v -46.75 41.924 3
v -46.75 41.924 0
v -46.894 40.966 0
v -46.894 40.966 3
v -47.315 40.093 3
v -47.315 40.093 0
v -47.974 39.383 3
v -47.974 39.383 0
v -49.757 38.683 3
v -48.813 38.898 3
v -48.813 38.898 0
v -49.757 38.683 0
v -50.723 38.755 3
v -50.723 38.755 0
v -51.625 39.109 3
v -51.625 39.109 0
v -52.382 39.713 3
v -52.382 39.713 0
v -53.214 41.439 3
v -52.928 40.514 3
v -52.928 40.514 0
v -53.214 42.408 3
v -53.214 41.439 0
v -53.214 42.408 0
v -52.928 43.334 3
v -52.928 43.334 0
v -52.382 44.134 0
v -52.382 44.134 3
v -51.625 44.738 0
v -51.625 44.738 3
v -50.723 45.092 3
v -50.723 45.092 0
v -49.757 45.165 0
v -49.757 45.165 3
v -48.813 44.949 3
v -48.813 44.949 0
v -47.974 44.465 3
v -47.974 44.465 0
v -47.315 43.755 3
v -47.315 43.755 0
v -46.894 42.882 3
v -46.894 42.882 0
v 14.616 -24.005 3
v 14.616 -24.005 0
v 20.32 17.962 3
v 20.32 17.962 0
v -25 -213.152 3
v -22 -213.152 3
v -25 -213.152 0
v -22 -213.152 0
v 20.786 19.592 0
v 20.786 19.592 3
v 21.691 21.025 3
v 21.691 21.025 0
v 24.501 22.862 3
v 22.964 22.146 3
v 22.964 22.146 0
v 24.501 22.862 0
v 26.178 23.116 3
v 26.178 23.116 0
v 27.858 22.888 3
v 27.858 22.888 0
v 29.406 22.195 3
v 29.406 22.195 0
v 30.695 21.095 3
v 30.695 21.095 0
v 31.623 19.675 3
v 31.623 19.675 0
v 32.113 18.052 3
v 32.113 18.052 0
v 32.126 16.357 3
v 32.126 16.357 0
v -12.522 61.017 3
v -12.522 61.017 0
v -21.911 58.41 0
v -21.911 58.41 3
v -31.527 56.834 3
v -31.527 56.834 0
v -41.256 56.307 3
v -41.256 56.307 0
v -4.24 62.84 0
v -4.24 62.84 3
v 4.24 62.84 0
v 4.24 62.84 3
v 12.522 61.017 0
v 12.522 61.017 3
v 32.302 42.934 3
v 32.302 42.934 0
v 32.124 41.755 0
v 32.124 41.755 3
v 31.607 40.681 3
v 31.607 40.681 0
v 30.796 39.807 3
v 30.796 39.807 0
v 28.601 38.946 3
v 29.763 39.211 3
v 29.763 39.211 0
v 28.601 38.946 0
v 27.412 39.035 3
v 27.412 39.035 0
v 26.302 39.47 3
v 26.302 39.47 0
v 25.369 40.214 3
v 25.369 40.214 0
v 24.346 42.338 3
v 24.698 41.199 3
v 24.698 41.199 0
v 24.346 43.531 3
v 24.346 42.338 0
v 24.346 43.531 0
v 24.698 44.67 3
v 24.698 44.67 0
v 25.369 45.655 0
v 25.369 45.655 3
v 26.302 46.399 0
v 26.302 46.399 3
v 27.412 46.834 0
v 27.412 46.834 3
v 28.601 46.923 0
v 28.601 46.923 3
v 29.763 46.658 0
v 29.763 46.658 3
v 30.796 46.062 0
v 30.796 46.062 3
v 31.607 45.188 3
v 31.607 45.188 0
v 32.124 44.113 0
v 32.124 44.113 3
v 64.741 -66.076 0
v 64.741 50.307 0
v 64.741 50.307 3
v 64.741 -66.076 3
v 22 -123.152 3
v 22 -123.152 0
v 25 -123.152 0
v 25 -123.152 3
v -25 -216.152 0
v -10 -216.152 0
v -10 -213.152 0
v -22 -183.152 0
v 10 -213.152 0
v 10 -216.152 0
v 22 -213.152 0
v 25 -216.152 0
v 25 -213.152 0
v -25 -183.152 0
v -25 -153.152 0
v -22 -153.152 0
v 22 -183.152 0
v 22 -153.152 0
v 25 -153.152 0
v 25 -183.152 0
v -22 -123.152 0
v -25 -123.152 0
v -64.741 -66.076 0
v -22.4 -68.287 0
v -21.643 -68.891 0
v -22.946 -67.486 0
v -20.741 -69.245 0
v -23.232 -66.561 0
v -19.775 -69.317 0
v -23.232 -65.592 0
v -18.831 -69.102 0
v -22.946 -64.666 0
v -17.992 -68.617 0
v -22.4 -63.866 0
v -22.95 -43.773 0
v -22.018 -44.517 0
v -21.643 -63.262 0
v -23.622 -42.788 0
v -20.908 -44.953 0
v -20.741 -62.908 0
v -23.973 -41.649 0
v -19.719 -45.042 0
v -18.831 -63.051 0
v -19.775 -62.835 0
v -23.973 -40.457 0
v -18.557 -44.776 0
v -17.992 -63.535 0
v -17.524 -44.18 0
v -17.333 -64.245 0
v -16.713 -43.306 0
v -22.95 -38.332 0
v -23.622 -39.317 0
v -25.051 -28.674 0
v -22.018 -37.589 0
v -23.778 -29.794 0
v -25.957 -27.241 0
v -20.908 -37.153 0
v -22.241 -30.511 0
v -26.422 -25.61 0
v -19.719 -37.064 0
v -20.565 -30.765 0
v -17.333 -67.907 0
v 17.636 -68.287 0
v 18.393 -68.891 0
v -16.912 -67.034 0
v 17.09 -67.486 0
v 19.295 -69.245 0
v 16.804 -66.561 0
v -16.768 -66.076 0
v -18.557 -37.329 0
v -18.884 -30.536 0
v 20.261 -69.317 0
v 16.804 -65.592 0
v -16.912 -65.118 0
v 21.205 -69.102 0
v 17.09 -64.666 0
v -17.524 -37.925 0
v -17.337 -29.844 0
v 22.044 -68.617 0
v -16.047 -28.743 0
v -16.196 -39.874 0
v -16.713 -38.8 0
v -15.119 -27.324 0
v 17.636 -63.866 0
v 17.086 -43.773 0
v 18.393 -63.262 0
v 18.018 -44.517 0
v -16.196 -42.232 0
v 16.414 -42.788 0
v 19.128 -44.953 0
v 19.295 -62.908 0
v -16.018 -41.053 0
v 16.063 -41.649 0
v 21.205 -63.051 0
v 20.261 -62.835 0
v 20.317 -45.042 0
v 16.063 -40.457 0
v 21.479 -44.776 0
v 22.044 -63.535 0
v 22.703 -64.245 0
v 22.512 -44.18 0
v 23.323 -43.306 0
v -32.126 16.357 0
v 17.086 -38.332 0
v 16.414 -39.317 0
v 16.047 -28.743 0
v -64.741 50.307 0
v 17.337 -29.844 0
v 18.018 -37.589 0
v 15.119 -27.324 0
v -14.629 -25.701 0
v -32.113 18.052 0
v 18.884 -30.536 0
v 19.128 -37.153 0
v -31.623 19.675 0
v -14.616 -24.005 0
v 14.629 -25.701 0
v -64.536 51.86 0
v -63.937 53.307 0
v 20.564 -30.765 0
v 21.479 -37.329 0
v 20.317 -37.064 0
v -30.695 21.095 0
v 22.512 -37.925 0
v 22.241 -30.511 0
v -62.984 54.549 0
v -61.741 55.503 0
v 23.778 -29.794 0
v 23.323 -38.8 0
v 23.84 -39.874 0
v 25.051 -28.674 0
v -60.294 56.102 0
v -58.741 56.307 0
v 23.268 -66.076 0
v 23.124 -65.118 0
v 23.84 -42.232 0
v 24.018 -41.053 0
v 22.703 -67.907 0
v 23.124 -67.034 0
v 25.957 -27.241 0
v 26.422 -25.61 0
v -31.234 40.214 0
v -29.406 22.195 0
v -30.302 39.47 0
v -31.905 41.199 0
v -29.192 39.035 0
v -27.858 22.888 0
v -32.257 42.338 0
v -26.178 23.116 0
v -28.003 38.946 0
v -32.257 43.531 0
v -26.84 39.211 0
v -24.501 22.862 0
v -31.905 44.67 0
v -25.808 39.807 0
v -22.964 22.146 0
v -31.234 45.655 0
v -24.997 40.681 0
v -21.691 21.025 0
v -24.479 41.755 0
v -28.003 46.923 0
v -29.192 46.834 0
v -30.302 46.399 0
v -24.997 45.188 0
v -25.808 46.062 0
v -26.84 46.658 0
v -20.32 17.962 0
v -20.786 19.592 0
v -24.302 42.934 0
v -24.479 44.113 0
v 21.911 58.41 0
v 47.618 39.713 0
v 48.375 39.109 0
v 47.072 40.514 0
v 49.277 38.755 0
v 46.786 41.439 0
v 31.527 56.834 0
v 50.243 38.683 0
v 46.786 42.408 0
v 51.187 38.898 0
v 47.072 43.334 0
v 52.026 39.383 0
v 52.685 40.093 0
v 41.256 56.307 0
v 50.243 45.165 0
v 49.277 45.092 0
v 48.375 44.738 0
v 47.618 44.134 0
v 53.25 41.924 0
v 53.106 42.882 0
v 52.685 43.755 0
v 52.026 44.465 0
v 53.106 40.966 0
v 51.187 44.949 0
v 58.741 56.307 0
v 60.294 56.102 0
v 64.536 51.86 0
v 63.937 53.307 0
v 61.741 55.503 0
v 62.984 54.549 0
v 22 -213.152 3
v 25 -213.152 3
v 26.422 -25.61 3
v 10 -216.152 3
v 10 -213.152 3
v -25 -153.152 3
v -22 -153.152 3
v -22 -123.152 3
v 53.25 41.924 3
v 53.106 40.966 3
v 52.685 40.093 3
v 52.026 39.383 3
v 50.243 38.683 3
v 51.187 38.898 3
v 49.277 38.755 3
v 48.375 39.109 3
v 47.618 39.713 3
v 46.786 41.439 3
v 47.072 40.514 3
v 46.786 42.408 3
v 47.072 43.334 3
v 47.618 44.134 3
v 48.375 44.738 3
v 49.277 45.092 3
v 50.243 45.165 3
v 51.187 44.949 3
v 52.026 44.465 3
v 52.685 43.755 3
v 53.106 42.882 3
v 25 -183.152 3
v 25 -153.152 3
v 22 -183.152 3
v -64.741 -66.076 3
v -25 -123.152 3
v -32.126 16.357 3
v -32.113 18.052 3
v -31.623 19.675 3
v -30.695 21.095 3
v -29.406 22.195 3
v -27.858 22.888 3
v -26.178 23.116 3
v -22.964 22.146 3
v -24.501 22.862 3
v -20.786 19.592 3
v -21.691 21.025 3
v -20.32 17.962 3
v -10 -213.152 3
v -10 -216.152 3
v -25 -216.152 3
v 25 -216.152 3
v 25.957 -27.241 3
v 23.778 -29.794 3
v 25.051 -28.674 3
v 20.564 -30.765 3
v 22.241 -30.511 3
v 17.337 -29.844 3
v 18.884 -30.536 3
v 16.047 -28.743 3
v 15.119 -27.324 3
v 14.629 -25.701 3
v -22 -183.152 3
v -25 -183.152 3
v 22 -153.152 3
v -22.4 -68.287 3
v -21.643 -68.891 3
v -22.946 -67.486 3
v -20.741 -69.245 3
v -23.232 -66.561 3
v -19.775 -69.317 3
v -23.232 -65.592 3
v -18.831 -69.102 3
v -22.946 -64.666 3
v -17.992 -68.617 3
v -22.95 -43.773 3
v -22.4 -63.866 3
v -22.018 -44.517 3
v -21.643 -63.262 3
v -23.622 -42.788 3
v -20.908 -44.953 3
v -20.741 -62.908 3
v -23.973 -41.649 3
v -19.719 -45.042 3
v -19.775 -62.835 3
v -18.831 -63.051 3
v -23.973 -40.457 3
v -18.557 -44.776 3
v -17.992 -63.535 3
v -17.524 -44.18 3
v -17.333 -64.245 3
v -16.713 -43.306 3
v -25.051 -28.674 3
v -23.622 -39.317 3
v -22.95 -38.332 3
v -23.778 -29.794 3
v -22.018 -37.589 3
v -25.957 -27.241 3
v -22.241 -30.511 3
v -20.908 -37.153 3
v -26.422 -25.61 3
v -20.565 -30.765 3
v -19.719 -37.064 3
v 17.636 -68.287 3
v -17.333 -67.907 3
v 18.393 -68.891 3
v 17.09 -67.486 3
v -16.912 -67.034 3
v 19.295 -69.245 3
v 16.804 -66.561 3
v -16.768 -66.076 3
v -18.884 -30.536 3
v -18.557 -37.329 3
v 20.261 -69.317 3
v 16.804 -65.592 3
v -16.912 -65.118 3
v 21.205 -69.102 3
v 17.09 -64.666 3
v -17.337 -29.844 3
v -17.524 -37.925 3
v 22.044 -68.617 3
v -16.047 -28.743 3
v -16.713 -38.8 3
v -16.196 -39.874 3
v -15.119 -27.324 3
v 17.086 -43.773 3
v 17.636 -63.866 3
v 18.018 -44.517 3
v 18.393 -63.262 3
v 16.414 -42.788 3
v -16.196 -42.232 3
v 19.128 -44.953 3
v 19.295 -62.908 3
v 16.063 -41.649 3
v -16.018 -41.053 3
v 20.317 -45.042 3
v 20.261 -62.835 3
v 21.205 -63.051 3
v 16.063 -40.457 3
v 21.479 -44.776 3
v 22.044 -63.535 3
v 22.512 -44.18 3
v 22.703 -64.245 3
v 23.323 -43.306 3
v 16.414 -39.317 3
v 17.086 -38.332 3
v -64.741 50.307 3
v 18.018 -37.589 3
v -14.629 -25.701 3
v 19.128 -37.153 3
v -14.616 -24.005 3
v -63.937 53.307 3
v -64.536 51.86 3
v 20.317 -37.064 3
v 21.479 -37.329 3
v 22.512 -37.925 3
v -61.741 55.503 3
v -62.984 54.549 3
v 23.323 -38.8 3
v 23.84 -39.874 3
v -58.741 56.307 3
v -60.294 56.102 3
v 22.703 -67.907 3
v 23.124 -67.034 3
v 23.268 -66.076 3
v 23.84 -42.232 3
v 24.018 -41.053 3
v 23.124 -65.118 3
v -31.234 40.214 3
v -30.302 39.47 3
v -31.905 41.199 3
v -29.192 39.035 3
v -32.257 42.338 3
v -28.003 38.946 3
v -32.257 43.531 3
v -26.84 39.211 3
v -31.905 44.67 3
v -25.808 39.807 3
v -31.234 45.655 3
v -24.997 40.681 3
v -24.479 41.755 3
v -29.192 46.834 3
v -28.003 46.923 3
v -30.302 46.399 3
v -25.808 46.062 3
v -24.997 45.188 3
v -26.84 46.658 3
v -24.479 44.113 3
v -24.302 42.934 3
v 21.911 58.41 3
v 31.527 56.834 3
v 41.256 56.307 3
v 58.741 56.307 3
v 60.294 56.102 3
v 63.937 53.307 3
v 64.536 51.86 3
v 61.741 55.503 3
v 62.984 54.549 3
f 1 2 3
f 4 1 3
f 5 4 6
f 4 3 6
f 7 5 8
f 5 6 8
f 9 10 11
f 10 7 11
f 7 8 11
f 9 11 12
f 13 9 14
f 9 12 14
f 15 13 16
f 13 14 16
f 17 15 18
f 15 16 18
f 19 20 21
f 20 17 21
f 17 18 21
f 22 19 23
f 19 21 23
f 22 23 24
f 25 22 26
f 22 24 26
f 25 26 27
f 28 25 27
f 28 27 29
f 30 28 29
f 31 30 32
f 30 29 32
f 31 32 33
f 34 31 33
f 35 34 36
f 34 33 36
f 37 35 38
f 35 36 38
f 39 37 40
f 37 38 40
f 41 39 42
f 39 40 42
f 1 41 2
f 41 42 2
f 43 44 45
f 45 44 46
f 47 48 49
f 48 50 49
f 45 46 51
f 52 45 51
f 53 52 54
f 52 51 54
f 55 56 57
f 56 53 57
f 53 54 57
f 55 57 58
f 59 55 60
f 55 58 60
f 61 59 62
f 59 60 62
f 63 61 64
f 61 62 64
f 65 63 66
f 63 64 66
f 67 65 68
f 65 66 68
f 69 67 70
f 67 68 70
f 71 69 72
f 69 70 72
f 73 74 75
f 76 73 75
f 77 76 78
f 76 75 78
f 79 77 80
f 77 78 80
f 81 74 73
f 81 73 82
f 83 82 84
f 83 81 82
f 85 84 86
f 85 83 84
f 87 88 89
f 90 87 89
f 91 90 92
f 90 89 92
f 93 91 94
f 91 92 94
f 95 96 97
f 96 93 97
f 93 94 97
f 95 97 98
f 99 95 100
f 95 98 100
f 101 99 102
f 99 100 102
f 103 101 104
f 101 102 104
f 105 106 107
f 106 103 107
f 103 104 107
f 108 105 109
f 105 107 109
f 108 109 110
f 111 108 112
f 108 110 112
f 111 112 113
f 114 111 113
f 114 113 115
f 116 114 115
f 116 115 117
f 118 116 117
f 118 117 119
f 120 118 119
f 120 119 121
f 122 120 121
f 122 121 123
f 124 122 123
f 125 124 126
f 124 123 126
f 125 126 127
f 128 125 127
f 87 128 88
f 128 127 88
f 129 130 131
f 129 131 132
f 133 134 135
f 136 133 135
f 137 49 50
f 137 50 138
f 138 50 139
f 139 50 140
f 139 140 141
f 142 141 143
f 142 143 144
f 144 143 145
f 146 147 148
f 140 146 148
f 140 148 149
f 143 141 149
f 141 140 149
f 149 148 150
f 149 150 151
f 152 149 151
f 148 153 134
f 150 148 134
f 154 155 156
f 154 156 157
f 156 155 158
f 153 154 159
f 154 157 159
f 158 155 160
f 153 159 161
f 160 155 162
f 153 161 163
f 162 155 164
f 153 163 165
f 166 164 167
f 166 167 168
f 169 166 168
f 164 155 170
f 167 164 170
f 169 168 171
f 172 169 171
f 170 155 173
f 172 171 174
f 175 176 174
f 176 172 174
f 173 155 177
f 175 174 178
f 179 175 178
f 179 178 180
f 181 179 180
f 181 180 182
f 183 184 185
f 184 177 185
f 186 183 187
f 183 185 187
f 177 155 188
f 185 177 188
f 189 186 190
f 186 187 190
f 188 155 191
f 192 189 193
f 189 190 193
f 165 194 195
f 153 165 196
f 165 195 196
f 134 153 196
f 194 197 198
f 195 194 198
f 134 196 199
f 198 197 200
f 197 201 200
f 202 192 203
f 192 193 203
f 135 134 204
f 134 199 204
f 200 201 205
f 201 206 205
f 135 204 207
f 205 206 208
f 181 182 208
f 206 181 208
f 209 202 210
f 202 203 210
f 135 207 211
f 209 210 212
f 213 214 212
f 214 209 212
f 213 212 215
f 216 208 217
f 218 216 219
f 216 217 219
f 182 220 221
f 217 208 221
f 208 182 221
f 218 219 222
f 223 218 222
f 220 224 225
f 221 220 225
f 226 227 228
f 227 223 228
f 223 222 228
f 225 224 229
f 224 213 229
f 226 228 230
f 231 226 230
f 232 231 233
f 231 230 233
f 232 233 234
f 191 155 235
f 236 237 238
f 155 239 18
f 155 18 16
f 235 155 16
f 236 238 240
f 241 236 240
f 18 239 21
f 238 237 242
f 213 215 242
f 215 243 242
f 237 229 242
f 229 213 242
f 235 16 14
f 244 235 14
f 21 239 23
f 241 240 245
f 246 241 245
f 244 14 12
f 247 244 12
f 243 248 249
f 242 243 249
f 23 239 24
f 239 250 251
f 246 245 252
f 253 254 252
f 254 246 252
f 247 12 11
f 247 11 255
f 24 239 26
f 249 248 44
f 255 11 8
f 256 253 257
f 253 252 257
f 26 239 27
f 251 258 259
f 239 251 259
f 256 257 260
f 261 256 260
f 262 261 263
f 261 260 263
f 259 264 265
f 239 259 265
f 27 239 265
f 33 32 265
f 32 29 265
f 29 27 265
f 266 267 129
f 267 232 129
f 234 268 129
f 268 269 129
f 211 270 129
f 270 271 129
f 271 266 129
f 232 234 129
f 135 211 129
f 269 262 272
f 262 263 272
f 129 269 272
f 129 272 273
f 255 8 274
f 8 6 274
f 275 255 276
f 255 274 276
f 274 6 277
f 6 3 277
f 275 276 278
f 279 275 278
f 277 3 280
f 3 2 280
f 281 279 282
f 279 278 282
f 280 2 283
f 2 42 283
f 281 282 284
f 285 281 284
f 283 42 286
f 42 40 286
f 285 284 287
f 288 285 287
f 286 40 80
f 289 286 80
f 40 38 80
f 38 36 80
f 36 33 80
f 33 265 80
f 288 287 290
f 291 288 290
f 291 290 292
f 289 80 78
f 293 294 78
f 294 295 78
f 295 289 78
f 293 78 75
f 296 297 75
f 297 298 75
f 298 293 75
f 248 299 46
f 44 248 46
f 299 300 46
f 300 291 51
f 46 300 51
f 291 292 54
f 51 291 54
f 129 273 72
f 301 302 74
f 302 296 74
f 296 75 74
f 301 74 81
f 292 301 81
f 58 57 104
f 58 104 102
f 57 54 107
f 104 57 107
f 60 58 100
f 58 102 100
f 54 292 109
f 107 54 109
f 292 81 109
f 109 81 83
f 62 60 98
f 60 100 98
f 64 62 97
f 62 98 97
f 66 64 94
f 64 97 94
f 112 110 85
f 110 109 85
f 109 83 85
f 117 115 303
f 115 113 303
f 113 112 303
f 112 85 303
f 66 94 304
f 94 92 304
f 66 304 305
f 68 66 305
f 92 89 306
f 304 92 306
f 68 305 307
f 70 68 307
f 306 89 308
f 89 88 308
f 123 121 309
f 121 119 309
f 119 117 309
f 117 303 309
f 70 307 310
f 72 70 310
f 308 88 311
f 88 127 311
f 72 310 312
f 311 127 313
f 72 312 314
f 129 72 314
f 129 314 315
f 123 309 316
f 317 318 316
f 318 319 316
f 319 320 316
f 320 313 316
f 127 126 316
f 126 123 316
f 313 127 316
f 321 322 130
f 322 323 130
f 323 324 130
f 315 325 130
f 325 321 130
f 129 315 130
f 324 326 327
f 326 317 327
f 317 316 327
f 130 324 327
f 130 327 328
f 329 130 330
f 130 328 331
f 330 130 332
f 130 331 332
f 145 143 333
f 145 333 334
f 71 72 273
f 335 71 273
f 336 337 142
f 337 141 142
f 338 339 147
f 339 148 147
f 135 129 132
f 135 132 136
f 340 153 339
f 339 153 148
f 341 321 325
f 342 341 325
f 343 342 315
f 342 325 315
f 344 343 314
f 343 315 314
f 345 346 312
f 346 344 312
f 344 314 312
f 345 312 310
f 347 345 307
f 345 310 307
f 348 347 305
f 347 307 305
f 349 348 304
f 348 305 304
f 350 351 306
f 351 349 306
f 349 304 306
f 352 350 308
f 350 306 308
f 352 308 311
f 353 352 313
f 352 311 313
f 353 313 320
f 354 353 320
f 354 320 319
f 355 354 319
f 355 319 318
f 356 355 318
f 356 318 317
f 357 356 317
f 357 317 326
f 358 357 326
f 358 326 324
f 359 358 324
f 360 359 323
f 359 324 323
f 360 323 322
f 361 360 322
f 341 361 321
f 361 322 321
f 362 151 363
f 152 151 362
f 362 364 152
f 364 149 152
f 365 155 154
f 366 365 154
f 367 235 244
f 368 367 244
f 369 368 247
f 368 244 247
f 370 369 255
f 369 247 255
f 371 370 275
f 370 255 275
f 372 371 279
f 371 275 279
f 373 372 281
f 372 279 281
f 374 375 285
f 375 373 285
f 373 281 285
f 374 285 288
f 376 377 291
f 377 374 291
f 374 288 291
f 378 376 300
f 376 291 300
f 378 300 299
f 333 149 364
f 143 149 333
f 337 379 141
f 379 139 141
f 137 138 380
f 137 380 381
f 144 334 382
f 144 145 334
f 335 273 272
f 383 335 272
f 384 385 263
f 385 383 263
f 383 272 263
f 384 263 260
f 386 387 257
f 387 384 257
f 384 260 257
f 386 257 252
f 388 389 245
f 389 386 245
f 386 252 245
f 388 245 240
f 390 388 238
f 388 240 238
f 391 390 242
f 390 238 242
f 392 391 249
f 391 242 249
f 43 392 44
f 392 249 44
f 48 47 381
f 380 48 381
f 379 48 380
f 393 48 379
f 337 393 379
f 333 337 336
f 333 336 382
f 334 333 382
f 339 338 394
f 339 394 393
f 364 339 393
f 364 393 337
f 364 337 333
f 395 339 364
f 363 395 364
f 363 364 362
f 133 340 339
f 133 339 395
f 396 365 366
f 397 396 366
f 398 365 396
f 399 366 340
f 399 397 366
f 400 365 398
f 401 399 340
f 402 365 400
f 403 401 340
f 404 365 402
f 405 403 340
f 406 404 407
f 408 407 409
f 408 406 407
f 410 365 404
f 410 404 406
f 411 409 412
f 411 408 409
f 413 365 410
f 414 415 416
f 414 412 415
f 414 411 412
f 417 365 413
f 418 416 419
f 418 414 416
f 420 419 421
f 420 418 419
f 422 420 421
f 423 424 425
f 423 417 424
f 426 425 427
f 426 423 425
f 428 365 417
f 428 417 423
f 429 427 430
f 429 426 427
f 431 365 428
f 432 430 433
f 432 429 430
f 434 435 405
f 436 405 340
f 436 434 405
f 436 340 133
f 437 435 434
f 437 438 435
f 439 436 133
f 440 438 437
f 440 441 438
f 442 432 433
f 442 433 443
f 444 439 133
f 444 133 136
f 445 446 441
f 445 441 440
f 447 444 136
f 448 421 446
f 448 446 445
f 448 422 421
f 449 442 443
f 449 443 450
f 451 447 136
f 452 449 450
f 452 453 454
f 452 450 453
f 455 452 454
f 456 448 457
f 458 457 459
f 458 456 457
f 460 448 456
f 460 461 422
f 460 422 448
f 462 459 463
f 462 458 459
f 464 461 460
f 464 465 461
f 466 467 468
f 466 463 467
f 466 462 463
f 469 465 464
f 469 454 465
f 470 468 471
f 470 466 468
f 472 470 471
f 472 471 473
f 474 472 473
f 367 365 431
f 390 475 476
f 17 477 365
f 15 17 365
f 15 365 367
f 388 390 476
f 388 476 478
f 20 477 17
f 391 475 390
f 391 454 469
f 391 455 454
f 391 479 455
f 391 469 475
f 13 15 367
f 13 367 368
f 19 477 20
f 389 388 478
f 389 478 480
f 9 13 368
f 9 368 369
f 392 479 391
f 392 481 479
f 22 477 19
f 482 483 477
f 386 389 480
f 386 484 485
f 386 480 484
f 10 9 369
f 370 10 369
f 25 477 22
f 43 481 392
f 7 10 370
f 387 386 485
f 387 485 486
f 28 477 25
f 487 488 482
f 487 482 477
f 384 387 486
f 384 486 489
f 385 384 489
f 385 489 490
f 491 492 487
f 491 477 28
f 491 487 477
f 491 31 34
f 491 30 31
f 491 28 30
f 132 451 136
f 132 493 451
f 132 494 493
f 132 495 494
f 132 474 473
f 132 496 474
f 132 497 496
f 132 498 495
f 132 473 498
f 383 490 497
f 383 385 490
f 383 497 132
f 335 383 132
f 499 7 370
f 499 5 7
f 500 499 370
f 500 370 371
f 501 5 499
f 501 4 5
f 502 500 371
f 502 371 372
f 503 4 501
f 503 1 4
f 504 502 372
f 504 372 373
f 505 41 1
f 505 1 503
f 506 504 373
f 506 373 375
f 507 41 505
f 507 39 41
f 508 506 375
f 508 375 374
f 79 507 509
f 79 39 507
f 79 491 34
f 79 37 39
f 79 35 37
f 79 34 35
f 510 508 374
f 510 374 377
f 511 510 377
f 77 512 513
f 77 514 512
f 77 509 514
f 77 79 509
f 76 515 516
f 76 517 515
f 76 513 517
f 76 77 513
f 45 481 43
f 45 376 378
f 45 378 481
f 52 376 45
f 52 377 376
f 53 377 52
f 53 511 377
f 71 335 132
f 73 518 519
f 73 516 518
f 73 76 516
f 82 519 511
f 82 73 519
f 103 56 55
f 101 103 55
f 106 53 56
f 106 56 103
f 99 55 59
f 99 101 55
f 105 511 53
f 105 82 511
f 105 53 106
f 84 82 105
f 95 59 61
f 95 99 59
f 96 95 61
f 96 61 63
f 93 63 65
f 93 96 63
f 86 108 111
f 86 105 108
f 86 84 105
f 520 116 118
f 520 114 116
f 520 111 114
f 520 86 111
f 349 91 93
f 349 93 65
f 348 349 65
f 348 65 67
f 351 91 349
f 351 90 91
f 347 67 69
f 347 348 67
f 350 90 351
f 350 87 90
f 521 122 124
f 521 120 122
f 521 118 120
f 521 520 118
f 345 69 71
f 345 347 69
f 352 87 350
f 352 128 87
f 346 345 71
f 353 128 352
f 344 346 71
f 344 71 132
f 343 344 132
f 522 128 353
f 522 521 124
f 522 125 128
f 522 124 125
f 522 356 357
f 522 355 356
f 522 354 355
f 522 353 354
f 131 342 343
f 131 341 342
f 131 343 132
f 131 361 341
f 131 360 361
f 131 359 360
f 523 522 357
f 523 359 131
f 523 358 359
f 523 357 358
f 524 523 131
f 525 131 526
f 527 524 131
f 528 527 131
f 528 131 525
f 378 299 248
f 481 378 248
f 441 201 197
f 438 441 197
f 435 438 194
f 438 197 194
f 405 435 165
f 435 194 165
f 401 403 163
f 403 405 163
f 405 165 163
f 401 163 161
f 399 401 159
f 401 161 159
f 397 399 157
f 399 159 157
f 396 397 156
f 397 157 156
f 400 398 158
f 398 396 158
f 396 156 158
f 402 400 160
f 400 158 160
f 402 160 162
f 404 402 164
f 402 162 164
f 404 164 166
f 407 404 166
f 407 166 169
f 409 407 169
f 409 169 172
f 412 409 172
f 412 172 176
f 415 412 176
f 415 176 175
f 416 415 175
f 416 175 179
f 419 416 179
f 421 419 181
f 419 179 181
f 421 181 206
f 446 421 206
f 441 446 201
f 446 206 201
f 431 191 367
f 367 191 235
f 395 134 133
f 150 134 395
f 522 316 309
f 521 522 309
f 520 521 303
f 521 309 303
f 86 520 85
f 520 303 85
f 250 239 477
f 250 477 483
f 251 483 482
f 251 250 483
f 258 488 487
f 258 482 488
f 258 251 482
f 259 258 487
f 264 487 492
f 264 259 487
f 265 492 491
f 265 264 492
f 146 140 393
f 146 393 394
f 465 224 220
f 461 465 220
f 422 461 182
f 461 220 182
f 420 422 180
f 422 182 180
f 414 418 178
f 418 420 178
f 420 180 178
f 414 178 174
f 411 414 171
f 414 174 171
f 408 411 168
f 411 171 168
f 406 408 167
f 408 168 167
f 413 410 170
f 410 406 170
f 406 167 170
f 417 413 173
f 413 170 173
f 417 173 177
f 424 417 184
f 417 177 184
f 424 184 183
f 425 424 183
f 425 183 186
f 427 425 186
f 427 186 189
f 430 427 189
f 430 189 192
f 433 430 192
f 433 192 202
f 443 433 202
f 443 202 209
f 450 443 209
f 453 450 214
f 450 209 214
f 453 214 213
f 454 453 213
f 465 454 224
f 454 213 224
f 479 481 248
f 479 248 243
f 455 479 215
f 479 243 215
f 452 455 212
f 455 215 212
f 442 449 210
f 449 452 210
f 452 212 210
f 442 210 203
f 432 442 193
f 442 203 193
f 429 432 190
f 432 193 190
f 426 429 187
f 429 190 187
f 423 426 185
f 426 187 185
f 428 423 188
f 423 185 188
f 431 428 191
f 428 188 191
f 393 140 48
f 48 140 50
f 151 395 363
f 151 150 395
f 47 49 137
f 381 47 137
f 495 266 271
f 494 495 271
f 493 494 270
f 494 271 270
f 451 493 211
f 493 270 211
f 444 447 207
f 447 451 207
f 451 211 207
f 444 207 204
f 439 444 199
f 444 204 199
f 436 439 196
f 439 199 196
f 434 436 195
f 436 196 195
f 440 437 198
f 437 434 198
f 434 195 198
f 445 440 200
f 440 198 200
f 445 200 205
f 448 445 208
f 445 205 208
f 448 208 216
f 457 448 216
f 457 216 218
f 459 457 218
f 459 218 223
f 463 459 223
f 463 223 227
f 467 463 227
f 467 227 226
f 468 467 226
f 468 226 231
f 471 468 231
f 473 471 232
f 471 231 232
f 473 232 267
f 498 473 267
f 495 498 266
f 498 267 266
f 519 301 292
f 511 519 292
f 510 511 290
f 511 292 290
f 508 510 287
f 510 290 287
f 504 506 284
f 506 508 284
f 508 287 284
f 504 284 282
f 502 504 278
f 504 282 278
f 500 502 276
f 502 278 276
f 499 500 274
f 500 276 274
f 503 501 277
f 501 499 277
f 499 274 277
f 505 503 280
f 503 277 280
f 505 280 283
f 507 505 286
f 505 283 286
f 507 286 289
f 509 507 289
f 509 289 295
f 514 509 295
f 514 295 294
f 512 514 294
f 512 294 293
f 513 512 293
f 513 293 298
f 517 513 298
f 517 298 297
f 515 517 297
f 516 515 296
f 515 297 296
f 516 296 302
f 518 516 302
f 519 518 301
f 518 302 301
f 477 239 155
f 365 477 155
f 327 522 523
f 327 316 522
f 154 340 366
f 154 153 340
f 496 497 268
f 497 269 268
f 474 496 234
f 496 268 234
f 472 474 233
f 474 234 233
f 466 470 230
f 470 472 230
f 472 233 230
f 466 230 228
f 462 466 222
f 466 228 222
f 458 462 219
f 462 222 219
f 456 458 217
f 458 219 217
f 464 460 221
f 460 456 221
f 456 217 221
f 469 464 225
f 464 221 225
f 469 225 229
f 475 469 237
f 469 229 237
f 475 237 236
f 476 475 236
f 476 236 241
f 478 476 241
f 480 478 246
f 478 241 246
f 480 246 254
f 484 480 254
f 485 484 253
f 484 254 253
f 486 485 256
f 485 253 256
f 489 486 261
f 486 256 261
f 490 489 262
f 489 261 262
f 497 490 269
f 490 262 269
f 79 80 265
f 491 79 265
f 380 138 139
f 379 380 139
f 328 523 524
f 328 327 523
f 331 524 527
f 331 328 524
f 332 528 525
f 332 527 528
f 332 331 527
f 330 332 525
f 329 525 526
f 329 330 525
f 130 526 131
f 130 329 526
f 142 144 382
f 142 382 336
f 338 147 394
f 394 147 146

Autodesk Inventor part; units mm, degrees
ref_plane "YZ Plane" through (0, 0, 0) normal (1, 0, 0) x (0, 1, 0)
ref_plane "XZ Plane" through (0, 0, 0) normal (0, 1, 0) x (-1, 0, 0)
ref_plane "XY Plane" through (0, 0, 0) normal (0, 0, 1) x (1, 0, 0)
sketch "Sketch1" plane through (0, 0, 0) normal (0, 0, 1) x (1, 0, 0)
  arc A0 (-20.3204, 17.9615) -> (-32.1264, 16.3566) centre (-26.2234, 17.159) ccw
  line L0 (-20.3204, 17.9615) -> (-14.6157, -24.0052)
  arc A1 (-26.4217, -25.6101) -> (-14.6157, -24.0052) centre (-20.5187, -24.8077) ccw
  line L1 (-26.4217, -25.6101) -> (-32.1264, 16.3566)
  arc A2 (-17.4681, 46.3619) -> (-13.8821, 37.9739) centre (-13.8821, 42.9344) ccw
  arc A3 (17.4681, 46.3619) -> (-17.4681, 46.3619) centre (0, 29.6659) ccw
  arc A4 (13.8821, 37.9739) -> (17.4681, 46.3619) centre (13.8821, 42.9344) ccw
  line L2 (13.8821, 37.9739) -> (-13.8821, 37.9739)
  arc A5 (32.1264, 16.3566) -> (20.3204, 17.9615) centre (26.2234, 17.159) ccw
  line L3 (32.1264, 16.3566) -> (26.4217, -25.6101)
  arc A6 (14.6157, -24.0052) -> (26.4217, -25.6101) centre (20.5187, -24.8077) ccw
  line L4 (14.6157, -24.0052) -> (20.3204, 17.9615)
  circle A7 centre (-28.3016, 42.9344) radius 4
  circle A8 centre (-20.018, -41.0528) radius 4
  circle A9 centre (20.018, -41.0528) radius 4
  circle A10 centre (28.3016, 42.9344) radius 4
  circle A11 centre (-50, 41.9238) radius 3.25
  circle A12 centre (50, 41.9238) radius 3.25
  circle A13 centre (20.018, -66.0762) radius 3.25
  circle A14 centre (-20.018, -66.0762) radius 3.25
  line L5 (64.7409, 50.3067) -> (64.7409, 34.44)
  arc A15 (64.7409, 50.3067) -> (58.7409, 56.3067) centre (58.7409, 50.3067) ccw
  line L6 (41.2562, 56.3067) -> (58.7409, 56.3067)
  arc A16 (12.5221, 61.0169) -> (41.2562, 56.3067) centre (41.2562, 146.3067) ccw
  arc A17 (12.5221, 61.0169) -> (-12.5221, 61.0169) centre (0, 23.8483) ccw
  arc A18 (-41.2562, 56.3067) -> (-12.5221, 61.0169) centre (-41.2562, 146.3067) ccw
  line L7 (-41.2562, 56.3067) -> (-58.7409, 56.3067)
  arc A19 (-58.7409, 56.3067) -> (-64.7409, 50.3067) centre (-58.7409, 50.3067) ccw
  line L8 (-64.7409, 50.3067) -> (-64.7409, 21.44)
  line L9 (-64.7409, 21.44) -> (-64.7409, -66.0762)
  line L10 (22, -123.1517) -> (25, -123.1517)
  line L11 (22, -153.1517) -> (25, -153.1517)
  line L12 (22, -183.1517) -> (25, -183.1517)
  line L13 (22, -213.1517) -> (25, -213.1517)
  line L14 (22, -183.1517) -> (22, -213.1517)
  line L15 (22, -123.1517) -> (22, -153.1517)
  line L16 (25, -153.1517) -> (25, -183.1517)
  line L17 (64.7409, -66.0762) -> (-64.7409, -66.0762) construction
  line L18 (64.7409, 34.44) -> (64.7409, -66.0762)
  line L19 (64.7409, -66.0762) -> (25, -123.1517)
  line L20 (25, -213.1517) -> (25, -216.1517)
  line L21 (25, -216.1517) -> (0, -216.1517)
  line L22 (0, -216.1517) -> (0, -66.0762)
  line L23 (-22, -123.1517) -> (-25, -123.1517)
  line L24 (-22, -153.1517) -> (-25, -153.1517)
  line L25 (-22, -183.1517) -> (-25, -183.1517)
  line L26 (-22, -213.1517) -> (-25, -213.1517)
  line L27 (-22, -183.1517) -> (-22, -213.1517)
  line L28 (-22, -123.1517) -> (-22, -153.1517)
  line L29 (-25, -153.1517) -> (-25, -183.1517)
  line L30 (-64.7409, -66.0762) -> (-25, -123.1517)
  line L31 (-25, -213.1517) -> (-25, -216.1517)
  line L32 (-25, -216.1517) -> (0, -216.1517)
  point P0 (20.018, -66.0762)
  point P1 (-64.7409, -22.3181)
  point P2 (27.0258, 23.062)
  point P3 (64.7409, 42.3734)
  dimension "d5" = 30
  dimension "d6" = 30
  dimension "d7" = 30
  dimension "d10" = 3
  dimension "d11" = 3
  dimension "d12" = 240
  dimension "d13" = 50
extrude "Extrusion1" add sketch "Sketch1" along normal blind 3 contours A3 A4 L2 A2 | L5 L18 L19 L10 L15 L11 L16 L12 L14 L13 L20 L21 L32 L31 L26 L27 L25 L29 L24 L28 L23 L30 L9 L8 A19 L7 A18 A17 A16 L6 A15
sketch "Sketch2" plane through (0, 0, 0) normal (0, 0, -1) x (-1, 0, 0)
  line L0 (-25, -216.1517) -> (25, -216.1517) projected
  line L1 (-10, -216.1517) -> (10, -216.1517)
  line L2 (10, -216.1517) -> (10, -213.1517)
  line L3 (10, -213.1517) -> (-10, -213.1517)
  line L4 (-10, -213.1517) -> (-10, -216.1517)
  line L5 (0, -213.1517) -> (0, -190.7997)
  point P0 (0, 0)
  dimension "d16" = 20
  dimension "d17" = 3
extrude "Extrusion2" cut sketch "Sketch2" against normal blind 6
properties part number "Arm - stand plate"
